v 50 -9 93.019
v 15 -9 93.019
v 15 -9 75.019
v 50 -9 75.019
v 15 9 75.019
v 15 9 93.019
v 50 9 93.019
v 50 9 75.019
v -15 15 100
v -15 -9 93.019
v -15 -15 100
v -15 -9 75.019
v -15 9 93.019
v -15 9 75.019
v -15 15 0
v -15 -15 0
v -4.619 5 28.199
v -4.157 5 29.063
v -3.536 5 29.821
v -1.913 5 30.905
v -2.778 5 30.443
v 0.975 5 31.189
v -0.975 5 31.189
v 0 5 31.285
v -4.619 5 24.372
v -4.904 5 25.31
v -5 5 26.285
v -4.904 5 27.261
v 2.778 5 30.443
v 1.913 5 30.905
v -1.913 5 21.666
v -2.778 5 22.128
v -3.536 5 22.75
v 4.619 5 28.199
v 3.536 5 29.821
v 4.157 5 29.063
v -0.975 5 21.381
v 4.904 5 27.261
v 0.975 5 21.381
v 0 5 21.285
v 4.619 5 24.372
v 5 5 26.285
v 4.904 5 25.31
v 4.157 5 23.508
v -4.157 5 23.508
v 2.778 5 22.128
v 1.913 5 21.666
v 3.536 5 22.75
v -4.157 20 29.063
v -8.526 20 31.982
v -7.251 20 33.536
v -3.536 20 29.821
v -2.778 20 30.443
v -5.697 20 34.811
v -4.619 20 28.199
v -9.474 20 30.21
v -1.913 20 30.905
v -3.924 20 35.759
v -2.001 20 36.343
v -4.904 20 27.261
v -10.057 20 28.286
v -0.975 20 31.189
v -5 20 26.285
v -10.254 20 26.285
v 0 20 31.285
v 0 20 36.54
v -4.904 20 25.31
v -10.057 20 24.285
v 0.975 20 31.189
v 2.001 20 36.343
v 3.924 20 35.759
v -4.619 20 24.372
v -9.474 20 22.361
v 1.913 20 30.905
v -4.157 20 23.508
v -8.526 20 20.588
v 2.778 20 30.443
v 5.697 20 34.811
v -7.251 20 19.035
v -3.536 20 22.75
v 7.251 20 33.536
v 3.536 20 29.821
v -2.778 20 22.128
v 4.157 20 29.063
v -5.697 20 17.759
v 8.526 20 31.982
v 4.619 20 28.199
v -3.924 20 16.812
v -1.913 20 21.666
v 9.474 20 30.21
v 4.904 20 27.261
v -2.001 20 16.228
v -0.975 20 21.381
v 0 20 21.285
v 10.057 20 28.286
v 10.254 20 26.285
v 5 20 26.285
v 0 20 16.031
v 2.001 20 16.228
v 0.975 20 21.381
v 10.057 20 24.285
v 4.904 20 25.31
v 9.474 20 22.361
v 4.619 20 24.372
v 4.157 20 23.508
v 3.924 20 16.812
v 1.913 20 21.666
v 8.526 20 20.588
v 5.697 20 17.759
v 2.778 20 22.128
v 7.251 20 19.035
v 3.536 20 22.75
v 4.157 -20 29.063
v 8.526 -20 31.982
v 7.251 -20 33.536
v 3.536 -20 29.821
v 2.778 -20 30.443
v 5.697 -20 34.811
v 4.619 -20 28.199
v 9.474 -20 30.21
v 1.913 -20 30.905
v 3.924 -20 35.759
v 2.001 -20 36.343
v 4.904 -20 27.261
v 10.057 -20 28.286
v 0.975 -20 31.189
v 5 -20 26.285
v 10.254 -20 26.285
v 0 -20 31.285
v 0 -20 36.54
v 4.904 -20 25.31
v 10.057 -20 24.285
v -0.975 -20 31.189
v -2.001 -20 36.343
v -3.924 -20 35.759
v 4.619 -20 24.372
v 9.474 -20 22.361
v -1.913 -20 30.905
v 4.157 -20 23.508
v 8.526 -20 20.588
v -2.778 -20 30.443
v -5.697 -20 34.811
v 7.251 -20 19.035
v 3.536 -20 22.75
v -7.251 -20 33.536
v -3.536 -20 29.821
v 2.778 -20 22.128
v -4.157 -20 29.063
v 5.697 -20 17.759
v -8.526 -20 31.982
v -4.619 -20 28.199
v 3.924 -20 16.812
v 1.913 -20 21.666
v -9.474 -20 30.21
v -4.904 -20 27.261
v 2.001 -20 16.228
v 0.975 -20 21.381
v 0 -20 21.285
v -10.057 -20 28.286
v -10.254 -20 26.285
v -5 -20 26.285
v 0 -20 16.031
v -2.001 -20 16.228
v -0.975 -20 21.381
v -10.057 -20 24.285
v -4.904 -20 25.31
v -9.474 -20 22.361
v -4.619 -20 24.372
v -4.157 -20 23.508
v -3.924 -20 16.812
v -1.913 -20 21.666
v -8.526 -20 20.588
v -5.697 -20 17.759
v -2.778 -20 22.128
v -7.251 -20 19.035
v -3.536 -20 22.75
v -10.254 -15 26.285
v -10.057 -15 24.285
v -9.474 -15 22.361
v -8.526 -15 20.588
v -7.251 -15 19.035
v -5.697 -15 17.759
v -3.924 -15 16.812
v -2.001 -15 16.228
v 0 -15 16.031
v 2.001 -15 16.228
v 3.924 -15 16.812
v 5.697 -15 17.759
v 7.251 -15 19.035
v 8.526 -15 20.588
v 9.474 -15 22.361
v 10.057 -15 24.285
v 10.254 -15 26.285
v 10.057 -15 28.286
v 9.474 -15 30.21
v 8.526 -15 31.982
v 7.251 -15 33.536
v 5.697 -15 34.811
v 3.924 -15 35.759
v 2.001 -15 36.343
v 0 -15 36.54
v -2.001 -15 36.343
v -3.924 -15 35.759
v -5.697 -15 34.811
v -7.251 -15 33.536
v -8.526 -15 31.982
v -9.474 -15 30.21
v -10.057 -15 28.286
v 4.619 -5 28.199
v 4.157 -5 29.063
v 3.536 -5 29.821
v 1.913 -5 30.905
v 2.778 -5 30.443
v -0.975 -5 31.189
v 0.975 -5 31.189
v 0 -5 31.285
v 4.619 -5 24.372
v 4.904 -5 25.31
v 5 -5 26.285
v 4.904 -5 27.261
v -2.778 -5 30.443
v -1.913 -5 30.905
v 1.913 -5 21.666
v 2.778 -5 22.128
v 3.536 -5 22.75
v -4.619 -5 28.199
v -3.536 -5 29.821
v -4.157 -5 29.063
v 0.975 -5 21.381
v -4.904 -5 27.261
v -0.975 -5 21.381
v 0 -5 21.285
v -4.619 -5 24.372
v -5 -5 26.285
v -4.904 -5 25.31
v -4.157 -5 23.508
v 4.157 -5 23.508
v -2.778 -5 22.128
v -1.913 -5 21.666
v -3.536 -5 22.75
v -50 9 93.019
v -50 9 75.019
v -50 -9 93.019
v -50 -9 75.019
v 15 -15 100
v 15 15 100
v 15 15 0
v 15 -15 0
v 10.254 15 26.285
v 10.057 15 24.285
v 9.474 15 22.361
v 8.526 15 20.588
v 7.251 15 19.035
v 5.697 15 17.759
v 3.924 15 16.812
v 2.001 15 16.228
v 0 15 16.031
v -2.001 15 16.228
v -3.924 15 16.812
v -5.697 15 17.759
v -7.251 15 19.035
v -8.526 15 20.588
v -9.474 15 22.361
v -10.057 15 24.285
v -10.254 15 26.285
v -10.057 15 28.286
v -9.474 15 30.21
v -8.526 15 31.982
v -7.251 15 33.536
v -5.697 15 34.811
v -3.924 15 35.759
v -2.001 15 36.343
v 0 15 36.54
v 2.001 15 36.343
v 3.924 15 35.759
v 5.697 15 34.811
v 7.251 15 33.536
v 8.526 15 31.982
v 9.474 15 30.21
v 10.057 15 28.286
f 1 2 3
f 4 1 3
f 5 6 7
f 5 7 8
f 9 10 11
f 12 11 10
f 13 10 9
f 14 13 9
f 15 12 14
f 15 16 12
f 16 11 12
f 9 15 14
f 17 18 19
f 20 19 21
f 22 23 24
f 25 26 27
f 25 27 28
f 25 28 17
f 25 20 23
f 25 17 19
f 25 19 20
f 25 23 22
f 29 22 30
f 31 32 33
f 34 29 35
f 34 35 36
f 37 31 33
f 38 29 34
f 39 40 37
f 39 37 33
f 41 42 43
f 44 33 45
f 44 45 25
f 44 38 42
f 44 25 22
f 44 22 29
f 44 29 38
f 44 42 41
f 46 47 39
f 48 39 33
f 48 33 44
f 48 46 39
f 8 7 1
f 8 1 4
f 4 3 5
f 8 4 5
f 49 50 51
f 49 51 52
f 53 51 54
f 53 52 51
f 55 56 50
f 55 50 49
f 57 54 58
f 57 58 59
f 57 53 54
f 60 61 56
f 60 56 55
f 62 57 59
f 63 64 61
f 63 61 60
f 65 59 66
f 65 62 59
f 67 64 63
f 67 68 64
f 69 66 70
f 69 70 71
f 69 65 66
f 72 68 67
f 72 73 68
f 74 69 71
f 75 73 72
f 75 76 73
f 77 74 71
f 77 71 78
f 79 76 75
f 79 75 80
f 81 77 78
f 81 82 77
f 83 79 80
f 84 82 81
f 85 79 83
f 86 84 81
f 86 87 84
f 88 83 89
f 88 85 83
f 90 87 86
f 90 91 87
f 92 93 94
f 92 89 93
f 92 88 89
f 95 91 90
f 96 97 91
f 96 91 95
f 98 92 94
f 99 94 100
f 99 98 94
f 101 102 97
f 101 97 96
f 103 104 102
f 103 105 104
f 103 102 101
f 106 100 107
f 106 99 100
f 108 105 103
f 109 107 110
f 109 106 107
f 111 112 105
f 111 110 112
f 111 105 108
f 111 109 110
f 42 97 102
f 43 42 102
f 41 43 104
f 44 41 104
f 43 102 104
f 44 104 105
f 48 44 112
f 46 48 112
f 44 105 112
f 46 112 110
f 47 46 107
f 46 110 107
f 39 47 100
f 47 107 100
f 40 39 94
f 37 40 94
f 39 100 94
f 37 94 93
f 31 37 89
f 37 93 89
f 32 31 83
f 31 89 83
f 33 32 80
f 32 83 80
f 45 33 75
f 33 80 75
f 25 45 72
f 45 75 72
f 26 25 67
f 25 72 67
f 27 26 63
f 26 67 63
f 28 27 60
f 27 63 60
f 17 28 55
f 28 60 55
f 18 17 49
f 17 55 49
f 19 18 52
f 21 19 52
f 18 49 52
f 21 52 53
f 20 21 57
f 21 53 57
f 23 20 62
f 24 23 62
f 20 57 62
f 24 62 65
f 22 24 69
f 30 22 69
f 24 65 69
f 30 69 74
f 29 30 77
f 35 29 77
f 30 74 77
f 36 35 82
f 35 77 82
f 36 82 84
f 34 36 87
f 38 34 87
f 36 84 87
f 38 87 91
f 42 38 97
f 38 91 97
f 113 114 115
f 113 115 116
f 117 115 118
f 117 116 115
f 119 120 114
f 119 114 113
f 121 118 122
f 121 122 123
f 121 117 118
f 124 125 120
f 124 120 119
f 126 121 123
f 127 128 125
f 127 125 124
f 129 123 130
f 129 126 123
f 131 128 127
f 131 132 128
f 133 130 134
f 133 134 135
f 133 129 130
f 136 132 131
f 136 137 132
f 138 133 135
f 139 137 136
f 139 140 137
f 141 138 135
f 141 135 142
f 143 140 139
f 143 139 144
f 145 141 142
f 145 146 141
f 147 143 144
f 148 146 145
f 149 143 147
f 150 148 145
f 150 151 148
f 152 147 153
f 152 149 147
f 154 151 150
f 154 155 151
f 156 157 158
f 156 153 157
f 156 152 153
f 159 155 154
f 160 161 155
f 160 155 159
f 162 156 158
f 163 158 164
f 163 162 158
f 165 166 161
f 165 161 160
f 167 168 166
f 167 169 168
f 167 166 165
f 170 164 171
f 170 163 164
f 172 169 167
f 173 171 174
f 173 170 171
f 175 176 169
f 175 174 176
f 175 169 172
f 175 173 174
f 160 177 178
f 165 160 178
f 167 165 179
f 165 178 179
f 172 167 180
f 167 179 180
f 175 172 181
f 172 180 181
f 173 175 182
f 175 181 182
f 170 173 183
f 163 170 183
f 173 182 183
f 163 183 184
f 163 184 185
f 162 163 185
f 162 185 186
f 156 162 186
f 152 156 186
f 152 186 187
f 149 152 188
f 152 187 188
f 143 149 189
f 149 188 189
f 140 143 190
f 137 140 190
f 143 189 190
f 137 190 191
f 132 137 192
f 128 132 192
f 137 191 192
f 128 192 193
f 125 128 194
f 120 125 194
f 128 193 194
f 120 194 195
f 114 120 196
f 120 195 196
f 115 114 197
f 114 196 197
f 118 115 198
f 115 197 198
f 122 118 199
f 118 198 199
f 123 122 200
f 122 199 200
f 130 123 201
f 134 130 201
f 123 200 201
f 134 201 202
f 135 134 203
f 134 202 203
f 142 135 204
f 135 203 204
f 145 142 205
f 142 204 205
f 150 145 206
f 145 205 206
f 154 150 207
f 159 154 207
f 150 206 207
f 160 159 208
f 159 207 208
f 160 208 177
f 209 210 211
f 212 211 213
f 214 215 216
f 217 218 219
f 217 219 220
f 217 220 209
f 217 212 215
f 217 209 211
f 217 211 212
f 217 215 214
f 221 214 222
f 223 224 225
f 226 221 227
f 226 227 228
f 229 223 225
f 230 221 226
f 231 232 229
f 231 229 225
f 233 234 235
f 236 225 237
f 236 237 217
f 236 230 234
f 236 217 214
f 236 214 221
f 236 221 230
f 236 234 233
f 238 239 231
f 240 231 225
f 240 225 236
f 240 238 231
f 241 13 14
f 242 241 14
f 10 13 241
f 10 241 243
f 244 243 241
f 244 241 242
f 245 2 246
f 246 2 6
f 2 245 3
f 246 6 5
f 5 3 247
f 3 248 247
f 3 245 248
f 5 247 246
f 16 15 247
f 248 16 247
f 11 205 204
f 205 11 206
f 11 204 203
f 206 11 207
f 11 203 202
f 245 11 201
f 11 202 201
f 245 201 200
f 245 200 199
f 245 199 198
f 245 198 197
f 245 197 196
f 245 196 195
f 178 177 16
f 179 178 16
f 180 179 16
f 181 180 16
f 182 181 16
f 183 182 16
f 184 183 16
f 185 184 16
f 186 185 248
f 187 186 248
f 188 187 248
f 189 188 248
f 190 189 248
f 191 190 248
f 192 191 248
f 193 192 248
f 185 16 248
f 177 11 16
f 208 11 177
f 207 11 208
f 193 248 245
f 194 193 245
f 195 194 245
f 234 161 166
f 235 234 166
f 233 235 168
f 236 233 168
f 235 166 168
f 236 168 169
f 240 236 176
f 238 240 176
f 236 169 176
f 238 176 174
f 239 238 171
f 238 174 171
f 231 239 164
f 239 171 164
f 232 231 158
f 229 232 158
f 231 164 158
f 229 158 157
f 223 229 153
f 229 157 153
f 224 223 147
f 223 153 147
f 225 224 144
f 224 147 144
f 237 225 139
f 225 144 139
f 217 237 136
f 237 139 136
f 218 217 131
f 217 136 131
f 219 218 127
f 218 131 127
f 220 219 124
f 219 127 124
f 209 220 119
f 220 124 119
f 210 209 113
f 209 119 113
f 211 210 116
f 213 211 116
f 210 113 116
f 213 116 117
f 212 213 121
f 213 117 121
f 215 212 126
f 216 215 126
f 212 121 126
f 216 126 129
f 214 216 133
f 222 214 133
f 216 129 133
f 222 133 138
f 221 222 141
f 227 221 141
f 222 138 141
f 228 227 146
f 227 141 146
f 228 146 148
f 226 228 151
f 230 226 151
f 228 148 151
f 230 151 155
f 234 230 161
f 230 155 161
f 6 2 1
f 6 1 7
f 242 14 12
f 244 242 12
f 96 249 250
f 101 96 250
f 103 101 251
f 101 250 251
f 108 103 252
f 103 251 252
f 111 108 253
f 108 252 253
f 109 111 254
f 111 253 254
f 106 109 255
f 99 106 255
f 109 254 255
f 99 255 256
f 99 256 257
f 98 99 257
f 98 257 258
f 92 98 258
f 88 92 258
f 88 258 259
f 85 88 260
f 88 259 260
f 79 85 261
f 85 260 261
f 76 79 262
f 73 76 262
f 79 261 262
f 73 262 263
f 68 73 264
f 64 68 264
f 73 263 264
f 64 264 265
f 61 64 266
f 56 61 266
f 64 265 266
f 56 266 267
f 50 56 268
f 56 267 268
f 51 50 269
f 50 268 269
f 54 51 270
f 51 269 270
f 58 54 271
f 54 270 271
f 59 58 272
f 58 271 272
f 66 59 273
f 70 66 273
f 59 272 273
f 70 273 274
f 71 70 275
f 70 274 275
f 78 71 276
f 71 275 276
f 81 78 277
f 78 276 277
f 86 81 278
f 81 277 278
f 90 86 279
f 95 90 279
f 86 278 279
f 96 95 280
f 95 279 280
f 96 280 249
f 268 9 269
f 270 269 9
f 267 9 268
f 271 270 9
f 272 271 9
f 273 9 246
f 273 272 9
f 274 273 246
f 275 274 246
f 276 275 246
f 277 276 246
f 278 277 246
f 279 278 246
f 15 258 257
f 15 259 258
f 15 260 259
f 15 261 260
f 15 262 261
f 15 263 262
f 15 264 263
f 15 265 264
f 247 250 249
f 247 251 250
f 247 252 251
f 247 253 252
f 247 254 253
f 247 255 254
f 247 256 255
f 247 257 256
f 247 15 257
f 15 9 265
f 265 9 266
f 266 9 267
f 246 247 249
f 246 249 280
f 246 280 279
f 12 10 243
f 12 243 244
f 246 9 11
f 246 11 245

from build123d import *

# Parameters (mm, degrees)
SKETCH_2_W               = 30
SKETCH_2_H               = 30
EXTRUDE_1_DEPTH          = 100
SKETCH_3_W               = 18
SKETCH_3_H               = 18
EXTRUDE_2_DEPTH          = 35
PATTERN_CIRCULAR_1_COUNT = 2
SKETCH_4_R               = 10.254249717
EXTRUDE_4_DEPTH          = 5
SKETCH_5_R               = 5
CUT_EXTRUDE_2_DEPTH      = 15
PATTERN_CIRCULAR_3_COUNT = 2
PATTERN_CIRCULAR_4_COUNT = 2


with BuildPart() as part:
    # 草图2 → 凸台-拉伸1 (new body)
    with BuildSketch(Plane.XY):
        Rectangle(SKETCH_2_W, SKETCH_2_H)
    extrude(amount=EXTRUDE_1_DEPTH)

    # 草图3 → 凸台-拉伸2 (add)
    with BuildSketch(Plane(origin=(15, 0, 0), x_dir=(0, 0, -1), z_dir=(1, 0, 0))):
        with Locations((-84.019000904, 0)):
            Rectangle(SKETCH_3_W, SKETCH_3_H)
    extrude_2 = extrude(amount=EXTRUDE_2_DEPTH)

    # 阵列(圆周)1: 凸台-拉伸2 ×2 about axis
    pattern_circular_1_axis = Axis((0, 0, 0), (0, 0, 1))
    for i in range(1, PATTERN_CIRCULAR_1_COUNT):
        add(extrude_2.rotate(pattern_circular_1_axis, i * 360 / PATTERN_CIRCULAR_1_COUNT))

    # 草图4 → 凸台-拉伸4 (add)
    with BuildSketch(Plane(origin=(0, 15, 0), x_dir=(1, 0, 0), z_dir=(0, 1, 0))):
        with Locations((0, -26.28538531)):
            Circle(SKETCH_4_R)
    extrude_4 = extrude(amount=EXTRUDE_4_DEPTH)

    # 草图5 → 切除-拉伸2 (cut)
    with BuildSketch(Plane(origin=(0, 20, 0), x_dir=(1, 0, 0), z_dir=(0, 1, 0))):
        with Locations((0, -26.28538531)):
            Circle(SKETCH_5_R)
    cut_extrude_2 = extrude(amount=-CUT_EXTRUDE_2_DEPTH, mode=Mode.SUBTRACT)

    # 阵列(圆周)3: 凸台-拉伸4 ×2 about axis
    pattern_circular_3_axis = Axis((0, 0, 100), (0, 0, -1))
    for i in range(1, PATTERN_CIRCULAR_3_COUNT):
        add(extrude_4.rotate(pattern_circular_3_axis, i * 360 / PATTERN_CIRCULAR_3_COUNT))

    # 阵列(圆周)4: 切除-拉伸2 ×2 about axis
    pattern_circular_4_axis = Axis((0, 0, 100), (0, 0, -1))
    for i in range(1, PATTERN_CIRCULAR_4_COUNT):
        add(cut_extrude_2.rotate(pattern_circular_4_axis, i * 360 / PATTERN_CIRCULAR_4_COUNT), mode=Mode.SUBTRACT)


solid = part.part
